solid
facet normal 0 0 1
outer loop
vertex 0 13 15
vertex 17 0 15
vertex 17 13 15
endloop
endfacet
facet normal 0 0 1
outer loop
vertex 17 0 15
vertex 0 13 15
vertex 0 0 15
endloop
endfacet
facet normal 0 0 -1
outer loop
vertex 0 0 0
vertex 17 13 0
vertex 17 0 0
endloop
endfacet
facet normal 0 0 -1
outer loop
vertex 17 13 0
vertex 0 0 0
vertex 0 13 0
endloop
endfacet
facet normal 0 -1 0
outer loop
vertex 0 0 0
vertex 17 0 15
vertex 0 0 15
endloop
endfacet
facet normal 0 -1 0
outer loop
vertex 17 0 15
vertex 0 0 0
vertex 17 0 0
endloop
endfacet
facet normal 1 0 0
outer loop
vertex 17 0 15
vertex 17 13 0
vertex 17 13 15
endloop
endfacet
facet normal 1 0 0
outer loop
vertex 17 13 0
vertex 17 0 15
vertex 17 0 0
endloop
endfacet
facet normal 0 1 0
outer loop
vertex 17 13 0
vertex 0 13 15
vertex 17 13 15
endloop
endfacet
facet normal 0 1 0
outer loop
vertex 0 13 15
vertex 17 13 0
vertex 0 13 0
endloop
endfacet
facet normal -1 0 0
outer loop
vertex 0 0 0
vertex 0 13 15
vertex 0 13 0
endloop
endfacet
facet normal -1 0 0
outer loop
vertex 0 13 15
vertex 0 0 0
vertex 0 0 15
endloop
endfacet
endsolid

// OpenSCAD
// Generated by SolidPython 1.0.1 on 2020-07-29 00:46:56


cube(size = [17, 13, 15]);
/***********************************************
*********      SolidPython code:      **********
************************************************
 
# import packages: SolidPython
from solid import *
from solid.utils import *
from itertools import chain, combinations, permutations


class Resize:

    def __init__(self, scad_file):
        self.scad_file = scad_file
        #self.scad_file = import_scad(scad_file)
        # cone/cylinder param:
        self.r1 = 0
        self.r2 = 0
        self.h = 0
        # rectangular prism param:
        self.w = 0
        self.l = 0
        # ellipse param:
        self.r = 0

    # import OpenScad code (file name corresponds to shape)


    # classify shape + parameters
    def assign(self, param1, param2, param3):
        if self.scad_file == 'cone.scad':
            self.r1 = param1
            self.r2 = param2
            self.h = param3
        elif self.scad_file == 'cylinder.scad':
            self.r1 = param1
            self.r2 = param2
            self.h = param3
        elif self.scad_file == 'rectangularPrism.scad':
            self.h = param1
            self.l = param2
            self.w = param3
        else:
            self.r = param1
            self.h = param2

    # resize parameters
    def iterate(self):
        x = range(3, 20, 2)
        i = 1
        if self.scad_file == 'cone.scad':
            tempList = list(permutations(x, 2))
            for temp in tempList:
                param1 = temp[0]
                param2 = temp[1]
                filepath = 'produced_scad_files/' + 'cone' + str(param1) + '_' + str(param2) + '_' + '.scad'
                scad_render_to_file(cylinder(h=param1, r1=param2, r2=0), filepath)

        elif self.scad_file == 'cylinder.scad':
            tempList = list(permutations(x, 3))
            for temp in tempList:
                param1 = temp[0]
                param2 = temp[1]
                filepath = 'produced_scad_files/' + 'cylinder' + str(param1) + '_' + str(param2) + '_' + '.scad'
                scad_render_to_file(cylinder(h=param1, r1=param2, r2=param2), filepath)

        elif self.scad_file == 'rectangularPrism.scad':
            tempList = list(permutations(x, 3))
            for temp in tempList:
                param1 = temp[0]
                param2 = temp[1]
                param3 = temp[2]
                filepath = 'produced_scad_files/' + 'rectangularPrism' + str(param1) + '_' + str(param2) + '_' + str(
                    param3) + '.scad'
                scad_render_to_file(cube(size=(param1, param2, param3)), filepath)

        elif self.scad_file == 'ellipse.scad':
            tempList = list(permutations(x, 4))
            for temp in tempList:
                param1 = temp[0]
                param2 = temp[1]
                param3 = temp[2]
                param4 = temp[3]
                filepath = 'produced_scad_files/' + 'ellipse' + str(param1) + '_' + str(param2) + '_' + str(param3) + '_' + str(param4) + '.scad'
                scad_render_to_file(scale([param1, param2, param3])(sphere(r=param4)), filepath)

    def render_to_scadfile(self):
        scad_render_to_file(scad, 'example.scad') 
 
************************************************/
